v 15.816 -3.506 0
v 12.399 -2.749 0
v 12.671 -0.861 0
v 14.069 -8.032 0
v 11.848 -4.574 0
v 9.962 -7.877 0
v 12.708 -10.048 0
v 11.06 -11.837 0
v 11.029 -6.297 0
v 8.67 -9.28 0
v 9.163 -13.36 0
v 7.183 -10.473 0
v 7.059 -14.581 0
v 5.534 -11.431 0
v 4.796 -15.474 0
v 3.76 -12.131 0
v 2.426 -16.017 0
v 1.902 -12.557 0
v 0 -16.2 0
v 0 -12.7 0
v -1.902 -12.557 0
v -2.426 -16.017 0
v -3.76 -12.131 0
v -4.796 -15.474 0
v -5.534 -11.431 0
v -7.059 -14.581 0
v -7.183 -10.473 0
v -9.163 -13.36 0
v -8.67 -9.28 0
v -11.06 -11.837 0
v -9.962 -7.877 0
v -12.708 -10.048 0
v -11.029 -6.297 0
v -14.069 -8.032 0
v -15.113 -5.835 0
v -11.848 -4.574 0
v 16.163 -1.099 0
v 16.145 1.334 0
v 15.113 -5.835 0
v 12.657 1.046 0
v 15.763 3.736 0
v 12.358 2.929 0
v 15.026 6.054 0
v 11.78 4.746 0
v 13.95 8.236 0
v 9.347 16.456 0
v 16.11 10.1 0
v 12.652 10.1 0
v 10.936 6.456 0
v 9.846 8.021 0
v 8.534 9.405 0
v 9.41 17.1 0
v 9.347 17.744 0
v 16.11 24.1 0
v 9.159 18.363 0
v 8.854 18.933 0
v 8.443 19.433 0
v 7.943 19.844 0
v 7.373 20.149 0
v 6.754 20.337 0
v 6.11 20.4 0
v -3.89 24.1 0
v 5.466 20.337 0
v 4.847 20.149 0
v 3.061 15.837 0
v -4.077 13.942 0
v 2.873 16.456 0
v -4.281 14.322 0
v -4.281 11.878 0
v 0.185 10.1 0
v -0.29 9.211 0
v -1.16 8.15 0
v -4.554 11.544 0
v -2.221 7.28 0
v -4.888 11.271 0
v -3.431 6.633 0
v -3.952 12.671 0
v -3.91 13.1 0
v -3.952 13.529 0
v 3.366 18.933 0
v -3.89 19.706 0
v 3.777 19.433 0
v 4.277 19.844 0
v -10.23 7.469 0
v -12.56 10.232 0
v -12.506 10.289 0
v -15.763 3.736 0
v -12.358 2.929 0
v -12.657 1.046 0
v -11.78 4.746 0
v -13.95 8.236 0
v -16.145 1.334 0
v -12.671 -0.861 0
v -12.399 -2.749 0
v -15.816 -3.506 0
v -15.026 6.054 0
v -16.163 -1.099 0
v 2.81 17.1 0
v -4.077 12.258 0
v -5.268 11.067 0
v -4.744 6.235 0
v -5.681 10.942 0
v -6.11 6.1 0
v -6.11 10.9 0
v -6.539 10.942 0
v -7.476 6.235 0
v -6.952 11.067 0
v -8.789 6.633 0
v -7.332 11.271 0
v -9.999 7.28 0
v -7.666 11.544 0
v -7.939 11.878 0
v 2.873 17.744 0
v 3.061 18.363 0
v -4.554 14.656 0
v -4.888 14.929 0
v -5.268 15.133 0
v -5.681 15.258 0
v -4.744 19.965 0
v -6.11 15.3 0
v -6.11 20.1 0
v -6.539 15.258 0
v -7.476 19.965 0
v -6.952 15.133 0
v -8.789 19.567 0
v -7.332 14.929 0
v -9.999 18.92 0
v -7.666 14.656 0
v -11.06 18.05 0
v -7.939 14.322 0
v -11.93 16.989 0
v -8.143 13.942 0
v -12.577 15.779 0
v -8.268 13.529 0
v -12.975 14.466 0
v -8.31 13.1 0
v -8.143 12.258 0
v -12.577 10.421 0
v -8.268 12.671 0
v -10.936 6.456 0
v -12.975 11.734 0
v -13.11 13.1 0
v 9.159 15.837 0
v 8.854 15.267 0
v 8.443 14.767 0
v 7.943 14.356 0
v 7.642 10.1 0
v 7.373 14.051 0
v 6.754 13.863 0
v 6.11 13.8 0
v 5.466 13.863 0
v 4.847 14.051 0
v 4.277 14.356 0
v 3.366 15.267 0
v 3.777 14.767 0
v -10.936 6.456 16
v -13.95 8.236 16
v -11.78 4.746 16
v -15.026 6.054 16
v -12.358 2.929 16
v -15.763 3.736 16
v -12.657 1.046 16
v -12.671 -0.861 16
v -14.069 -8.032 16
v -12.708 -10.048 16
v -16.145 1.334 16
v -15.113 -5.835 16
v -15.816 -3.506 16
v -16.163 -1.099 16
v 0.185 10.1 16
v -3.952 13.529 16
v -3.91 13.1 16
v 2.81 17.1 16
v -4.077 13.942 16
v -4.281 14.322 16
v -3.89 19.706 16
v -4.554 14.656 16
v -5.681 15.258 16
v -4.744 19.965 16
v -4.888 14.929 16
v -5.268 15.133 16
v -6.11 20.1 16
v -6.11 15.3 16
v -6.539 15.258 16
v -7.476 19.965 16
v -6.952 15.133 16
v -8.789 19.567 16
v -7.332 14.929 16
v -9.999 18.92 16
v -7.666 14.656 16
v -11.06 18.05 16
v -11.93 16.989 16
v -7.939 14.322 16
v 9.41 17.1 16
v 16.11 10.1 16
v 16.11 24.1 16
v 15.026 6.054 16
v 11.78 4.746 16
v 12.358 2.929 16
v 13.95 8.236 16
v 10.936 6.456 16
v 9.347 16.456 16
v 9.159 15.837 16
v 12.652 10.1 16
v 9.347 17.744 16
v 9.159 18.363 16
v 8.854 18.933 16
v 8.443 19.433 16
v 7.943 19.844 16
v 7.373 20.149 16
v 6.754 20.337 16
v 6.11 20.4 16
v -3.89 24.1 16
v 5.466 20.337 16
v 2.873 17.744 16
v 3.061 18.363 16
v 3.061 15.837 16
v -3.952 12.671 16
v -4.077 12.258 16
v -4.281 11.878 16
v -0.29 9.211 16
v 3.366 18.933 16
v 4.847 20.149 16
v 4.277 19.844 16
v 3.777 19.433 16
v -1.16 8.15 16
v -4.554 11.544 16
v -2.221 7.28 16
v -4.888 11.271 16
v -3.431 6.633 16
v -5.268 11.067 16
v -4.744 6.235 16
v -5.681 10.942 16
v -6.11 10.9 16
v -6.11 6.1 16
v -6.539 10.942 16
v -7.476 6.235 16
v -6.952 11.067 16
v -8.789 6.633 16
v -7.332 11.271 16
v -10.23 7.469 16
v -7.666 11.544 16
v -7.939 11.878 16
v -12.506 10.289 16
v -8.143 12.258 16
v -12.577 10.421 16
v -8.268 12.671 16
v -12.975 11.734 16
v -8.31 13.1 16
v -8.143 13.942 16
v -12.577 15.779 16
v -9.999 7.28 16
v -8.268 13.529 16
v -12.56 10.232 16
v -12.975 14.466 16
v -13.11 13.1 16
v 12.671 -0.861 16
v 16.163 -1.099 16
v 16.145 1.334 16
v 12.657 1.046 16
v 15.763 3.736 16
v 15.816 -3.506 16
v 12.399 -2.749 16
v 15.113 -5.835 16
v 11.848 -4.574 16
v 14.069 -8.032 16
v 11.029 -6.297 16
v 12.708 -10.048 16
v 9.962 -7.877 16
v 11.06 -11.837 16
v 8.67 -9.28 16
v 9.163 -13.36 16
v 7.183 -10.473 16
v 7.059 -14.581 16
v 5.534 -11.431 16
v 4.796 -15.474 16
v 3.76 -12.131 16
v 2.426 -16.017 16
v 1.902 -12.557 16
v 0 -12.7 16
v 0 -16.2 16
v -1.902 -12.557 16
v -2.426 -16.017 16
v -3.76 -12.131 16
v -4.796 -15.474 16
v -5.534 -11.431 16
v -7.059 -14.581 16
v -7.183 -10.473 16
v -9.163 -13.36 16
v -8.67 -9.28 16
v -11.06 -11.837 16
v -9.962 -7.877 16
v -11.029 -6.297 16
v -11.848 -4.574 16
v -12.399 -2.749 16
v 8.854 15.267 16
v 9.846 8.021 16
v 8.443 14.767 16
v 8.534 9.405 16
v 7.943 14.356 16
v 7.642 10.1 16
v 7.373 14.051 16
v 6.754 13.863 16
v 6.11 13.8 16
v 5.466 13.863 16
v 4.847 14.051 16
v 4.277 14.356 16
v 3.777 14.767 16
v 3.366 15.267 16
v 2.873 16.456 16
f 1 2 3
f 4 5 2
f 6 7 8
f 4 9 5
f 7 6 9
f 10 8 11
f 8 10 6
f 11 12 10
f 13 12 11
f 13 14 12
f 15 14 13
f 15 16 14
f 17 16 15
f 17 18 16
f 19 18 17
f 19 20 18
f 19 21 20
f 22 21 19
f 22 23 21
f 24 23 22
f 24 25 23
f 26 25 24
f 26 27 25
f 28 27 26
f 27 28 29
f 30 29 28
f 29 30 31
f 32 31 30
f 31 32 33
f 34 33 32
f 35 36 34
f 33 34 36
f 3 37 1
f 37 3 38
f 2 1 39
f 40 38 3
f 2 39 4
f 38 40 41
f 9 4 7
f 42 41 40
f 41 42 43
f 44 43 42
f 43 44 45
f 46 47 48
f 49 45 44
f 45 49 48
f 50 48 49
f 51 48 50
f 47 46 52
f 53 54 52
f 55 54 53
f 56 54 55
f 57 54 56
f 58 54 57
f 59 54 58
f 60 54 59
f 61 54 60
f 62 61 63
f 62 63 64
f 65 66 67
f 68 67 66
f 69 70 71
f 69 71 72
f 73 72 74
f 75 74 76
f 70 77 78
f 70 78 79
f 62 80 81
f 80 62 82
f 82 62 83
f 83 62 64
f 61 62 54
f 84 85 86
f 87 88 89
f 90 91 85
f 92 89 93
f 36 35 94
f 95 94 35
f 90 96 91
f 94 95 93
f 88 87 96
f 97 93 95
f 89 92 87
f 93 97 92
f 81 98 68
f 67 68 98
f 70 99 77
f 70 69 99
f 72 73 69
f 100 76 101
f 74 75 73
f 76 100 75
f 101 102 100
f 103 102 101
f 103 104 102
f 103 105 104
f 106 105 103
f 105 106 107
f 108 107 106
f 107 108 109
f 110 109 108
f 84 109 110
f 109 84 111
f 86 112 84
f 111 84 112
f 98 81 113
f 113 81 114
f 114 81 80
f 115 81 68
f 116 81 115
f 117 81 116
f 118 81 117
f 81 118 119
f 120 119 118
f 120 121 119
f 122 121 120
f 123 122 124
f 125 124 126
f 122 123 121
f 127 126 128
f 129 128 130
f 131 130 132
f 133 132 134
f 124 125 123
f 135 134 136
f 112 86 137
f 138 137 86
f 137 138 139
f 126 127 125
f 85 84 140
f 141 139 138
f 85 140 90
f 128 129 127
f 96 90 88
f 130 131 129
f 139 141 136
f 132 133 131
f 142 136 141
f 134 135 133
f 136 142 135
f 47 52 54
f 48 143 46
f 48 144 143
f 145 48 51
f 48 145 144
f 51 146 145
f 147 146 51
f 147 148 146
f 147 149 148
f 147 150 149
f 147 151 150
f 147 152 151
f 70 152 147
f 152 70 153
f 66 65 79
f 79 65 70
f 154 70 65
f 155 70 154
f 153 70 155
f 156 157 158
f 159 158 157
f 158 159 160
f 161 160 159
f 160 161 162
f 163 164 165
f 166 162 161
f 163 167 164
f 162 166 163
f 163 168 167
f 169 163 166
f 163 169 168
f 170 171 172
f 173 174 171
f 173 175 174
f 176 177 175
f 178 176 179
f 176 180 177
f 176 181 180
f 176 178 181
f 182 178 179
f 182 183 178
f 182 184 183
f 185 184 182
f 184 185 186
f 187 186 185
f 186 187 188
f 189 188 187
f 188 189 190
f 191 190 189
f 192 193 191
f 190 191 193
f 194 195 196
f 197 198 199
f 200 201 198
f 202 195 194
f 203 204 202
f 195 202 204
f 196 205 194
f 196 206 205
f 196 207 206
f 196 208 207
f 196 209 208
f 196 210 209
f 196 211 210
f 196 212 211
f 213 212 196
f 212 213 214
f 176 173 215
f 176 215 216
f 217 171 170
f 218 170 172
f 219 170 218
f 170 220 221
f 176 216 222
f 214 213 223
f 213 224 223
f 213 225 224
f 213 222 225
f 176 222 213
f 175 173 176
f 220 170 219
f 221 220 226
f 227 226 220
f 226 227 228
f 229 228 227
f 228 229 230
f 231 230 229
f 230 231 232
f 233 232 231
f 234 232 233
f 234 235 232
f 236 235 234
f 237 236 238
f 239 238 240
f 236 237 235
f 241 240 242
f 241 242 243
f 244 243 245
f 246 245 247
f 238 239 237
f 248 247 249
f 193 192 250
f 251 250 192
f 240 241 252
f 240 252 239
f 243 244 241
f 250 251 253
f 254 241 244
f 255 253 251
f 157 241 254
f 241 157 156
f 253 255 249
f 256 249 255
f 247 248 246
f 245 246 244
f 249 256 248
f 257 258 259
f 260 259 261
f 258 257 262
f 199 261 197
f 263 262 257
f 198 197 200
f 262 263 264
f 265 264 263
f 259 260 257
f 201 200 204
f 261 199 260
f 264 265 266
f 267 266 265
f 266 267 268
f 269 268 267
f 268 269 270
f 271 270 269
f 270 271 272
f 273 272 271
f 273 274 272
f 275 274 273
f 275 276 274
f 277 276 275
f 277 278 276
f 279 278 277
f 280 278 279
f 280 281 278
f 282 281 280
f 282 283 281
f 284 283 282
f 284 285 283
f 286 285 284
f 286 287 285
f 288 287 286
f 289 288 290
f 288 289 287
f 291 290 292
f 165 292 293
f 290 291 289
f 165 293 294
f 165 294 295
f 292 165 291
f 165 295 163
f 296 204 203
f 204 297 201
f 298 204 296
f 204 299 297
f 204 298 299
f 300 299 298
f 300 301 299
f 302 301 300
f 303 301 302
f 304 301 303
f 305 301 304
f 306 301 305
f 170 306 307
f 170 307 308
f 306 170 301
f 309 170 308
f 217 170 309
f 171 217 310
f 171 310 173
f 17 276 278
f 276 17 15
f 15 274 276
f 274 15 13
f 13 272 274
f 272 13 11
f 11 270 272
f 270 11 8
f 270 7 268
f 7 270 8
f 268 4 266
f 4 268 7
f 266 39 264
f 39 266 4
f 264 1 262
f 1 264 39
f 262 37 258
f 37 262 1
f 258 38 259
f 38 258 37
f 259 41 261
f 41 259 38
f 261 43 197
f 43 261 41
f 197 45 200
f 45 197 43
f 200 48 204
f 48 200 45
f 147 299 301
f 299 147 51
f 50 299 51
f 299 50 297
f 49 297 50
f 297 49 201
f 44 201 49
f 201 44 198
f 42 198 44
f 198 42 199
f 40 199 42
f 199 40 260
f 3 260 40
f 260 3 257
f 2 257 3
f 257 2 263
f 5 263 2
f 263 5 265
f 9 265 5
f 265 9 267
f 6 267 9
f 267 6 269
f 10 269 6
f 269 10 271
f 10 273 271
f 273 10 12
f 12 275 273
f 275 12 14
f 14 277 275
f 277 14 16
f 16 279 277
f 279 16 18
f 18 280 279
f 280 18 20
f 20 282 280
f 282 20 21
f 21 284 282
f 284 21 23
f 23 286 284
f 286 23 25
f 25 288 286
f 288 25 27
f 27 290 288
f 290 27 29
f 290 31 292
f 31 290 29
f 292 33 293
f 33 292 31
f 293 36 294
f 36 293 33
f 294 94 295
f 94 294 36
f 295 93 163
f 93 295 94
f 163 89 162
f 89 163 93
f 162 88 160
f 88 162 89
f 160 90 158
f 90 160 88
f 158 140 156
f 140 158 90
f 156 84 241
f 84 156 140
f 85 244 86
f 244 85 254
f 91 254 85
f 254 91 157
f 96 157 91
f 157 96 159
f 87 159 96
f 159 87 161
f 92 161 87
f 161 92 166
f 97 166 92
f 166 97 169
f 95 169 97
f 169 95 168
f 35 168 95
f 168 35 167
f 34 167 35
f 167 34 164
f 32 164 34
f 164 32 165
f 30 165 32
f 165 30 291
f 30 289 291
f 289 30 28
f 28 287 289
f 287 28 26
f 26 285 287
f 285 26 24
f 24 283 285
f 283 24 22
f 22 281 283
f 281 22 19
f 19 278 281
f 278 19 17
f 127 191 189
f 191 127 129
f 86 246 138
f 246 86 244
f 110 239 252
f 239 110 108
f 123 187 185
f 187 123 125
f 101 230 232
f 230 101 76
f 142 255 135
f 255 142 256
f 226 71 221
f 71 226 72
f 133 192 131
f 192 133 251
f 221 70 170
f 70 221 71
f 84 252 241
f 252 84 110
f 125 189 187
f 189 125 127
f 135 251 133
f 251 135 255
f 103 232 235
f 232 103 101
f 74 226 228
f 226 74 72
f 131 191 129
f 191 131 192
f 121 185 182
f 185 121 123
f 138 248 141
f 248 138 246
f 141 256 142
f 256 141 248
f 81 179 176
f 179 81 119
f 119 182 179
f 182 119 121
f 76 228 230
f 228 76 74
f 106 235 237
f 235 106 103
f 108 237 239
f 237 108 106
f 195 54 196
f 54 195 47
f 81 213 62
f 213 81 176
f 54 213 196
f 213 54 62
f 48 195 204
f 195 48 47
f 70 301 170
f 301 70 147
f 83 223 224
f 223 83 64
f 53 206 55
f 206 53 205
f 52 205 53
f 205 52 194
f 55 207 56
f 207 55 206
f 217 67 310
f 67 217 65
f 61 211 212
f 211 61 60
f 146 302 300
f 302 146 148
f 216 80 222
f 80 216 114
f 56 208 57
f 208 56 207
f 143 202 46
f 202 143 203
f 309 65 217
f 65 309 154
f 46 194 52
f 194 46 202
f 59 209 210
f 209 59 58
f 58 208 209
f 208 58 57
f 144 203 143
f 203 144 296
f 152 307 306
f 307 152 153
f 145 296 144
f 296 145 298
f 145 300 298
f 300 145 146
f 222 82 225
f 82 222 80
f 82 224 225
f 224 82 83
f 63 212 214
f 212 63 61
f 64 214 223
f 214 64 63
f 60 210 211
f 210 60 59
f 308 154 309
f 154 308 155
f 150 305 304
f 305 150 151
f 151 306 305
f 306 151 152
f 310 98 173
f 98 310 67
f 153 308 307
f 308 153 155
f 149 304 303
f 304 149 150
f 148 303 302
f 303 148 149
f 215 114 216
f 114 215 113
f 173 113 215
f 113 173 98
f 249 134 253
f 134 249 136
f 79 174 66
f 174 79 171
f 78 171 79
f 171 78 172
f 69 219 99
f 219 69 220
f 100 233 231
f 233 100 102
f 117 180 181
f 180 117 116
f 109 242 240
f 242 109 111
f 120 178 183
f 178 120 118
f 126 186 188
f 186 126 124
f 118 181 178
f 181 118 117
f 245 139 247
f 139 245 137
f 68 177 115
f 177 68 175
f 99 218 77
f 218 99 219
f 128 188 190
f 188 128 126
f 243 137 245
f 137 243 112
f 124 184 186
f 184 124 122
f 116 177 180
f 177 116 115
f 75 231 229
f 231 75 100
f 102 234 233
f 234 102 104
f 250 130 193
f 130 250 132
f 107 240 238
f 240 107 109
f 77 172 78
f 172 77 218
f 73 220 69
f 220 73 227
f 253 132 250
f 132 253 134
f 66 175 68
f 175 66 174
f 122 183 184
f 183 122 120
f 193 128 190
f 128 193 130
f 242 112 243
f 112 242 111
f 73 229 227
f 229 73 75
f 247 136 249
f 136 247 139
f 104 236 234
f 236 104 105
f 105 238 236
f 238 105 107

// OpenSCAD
$fn = 32;

// ----------------------------------------------------------------------
// Pipe clamp: 32.4 mm ring, 3.5 mm wall, 16 mm wide
// ----------------------------------------------------------------------

// --- parameters (mm) ---
outer_r = 16.2;           // clamp outside radius
inner_r = 12.7;           // pipe bore radius
band = 3.5;               // band thickness
clamp_w = 16;             // clamp width
opening = 50;             // opening angle between the ends
lug_w = 20;               // lug width
lug_len = 14;             // lug length
bolt_d = 6.6;             // bolt hole
knuckle_d = 14;           // hinge knuckle diameter
pin_d = 4.4;              // hinge pin hole

clamp_profile = [[-6.846, 14.682], [-8.968, 13.492], [-10.887, 11.997], [-12.56, 10.232], [-13.95, 8.236], [-15.026, 6.054], [-15.763, 3.736], [-16.145, 1.334], [-16.163, -1.099], [-15.816, -3.506], [-15.113, -5.835], [-14.069, -8.032], [-12.708, -10.048], [-11.06, -11.837], [-9.163, -13.36], [-7.059, -14.581], [-4.796, -15.474], [-2.426, -16.017], [0, -16.2], [2.426, -16.017], [4.796, -15.474], [7.059, -14.581], [9.163, -13.36], [11.06, -11.837], [12.708, -10.048], [14.069, -8.032], [15.113, -5.835], [15.816, -3.506], [16.163, -1.099], [16.145, 1.334], [15.763, 3.736], [15.026, 6.054], [13.95, 8.236], [12.56, 10.232], [10.887, 11.997], [8.968, 13.492], [6.846, 14.682], [5.367, 11.51], [7.03, 10.577], [8.534, 9.405], [9.846, 8.021], [10.936, 6.456], [11.78, 4.746], [12.358, 2.929], [12.657, 1.046], [12.671, -0.861], [12.399, -2.749], [11.848, -4.574], [11.029, -6.297], [9.962, -7.877], [8.67, -9.28], [7.183, -10.473], [5.534, -11.431], [3.76, -12.131], [1.902, -12.557], [0, -12.7], [-1.902, -12.557], [-3.76, -12.131], [-5.534, -11.431], [-7.183, -10.473], [-8.67, -9.28], [-9.962, -7.877], [-11.029, -6.297], [-11.848, -4.574], [-12.399, -2.749], [-12.671, -0.861], [-12.657, 1.046], [-12.358, 2.929], [-11.78, 4.746], [-10.936, 6.456], [-9.846, 8.021], [-8.534, 9.405], [-7.03, 10.577], [-5.367, 11.51]];

difference() {
  union() {
    linear_extrude(height = clamp_w) polygon(clamp_profile);
    /* hinge knuckle, sunk 2 mm into the band end */
    translate([-6.11, 13.1, 0]) cylinder(h = clamp_w, d = knuckle_d);
    /* bolt lug on the other end */
    translate([-3.89, 10.1, 0]) cube([lug_w, 14, clamp_w]);
  }
  translate([6.11, 17.1, -2.5]) cylinder(h = clamp_w + 5, d = bolt_d);
  translate([-6.11, 13.1, -2.5]) cylinder(h = clamp_w + 5, d = pin_d);
}
